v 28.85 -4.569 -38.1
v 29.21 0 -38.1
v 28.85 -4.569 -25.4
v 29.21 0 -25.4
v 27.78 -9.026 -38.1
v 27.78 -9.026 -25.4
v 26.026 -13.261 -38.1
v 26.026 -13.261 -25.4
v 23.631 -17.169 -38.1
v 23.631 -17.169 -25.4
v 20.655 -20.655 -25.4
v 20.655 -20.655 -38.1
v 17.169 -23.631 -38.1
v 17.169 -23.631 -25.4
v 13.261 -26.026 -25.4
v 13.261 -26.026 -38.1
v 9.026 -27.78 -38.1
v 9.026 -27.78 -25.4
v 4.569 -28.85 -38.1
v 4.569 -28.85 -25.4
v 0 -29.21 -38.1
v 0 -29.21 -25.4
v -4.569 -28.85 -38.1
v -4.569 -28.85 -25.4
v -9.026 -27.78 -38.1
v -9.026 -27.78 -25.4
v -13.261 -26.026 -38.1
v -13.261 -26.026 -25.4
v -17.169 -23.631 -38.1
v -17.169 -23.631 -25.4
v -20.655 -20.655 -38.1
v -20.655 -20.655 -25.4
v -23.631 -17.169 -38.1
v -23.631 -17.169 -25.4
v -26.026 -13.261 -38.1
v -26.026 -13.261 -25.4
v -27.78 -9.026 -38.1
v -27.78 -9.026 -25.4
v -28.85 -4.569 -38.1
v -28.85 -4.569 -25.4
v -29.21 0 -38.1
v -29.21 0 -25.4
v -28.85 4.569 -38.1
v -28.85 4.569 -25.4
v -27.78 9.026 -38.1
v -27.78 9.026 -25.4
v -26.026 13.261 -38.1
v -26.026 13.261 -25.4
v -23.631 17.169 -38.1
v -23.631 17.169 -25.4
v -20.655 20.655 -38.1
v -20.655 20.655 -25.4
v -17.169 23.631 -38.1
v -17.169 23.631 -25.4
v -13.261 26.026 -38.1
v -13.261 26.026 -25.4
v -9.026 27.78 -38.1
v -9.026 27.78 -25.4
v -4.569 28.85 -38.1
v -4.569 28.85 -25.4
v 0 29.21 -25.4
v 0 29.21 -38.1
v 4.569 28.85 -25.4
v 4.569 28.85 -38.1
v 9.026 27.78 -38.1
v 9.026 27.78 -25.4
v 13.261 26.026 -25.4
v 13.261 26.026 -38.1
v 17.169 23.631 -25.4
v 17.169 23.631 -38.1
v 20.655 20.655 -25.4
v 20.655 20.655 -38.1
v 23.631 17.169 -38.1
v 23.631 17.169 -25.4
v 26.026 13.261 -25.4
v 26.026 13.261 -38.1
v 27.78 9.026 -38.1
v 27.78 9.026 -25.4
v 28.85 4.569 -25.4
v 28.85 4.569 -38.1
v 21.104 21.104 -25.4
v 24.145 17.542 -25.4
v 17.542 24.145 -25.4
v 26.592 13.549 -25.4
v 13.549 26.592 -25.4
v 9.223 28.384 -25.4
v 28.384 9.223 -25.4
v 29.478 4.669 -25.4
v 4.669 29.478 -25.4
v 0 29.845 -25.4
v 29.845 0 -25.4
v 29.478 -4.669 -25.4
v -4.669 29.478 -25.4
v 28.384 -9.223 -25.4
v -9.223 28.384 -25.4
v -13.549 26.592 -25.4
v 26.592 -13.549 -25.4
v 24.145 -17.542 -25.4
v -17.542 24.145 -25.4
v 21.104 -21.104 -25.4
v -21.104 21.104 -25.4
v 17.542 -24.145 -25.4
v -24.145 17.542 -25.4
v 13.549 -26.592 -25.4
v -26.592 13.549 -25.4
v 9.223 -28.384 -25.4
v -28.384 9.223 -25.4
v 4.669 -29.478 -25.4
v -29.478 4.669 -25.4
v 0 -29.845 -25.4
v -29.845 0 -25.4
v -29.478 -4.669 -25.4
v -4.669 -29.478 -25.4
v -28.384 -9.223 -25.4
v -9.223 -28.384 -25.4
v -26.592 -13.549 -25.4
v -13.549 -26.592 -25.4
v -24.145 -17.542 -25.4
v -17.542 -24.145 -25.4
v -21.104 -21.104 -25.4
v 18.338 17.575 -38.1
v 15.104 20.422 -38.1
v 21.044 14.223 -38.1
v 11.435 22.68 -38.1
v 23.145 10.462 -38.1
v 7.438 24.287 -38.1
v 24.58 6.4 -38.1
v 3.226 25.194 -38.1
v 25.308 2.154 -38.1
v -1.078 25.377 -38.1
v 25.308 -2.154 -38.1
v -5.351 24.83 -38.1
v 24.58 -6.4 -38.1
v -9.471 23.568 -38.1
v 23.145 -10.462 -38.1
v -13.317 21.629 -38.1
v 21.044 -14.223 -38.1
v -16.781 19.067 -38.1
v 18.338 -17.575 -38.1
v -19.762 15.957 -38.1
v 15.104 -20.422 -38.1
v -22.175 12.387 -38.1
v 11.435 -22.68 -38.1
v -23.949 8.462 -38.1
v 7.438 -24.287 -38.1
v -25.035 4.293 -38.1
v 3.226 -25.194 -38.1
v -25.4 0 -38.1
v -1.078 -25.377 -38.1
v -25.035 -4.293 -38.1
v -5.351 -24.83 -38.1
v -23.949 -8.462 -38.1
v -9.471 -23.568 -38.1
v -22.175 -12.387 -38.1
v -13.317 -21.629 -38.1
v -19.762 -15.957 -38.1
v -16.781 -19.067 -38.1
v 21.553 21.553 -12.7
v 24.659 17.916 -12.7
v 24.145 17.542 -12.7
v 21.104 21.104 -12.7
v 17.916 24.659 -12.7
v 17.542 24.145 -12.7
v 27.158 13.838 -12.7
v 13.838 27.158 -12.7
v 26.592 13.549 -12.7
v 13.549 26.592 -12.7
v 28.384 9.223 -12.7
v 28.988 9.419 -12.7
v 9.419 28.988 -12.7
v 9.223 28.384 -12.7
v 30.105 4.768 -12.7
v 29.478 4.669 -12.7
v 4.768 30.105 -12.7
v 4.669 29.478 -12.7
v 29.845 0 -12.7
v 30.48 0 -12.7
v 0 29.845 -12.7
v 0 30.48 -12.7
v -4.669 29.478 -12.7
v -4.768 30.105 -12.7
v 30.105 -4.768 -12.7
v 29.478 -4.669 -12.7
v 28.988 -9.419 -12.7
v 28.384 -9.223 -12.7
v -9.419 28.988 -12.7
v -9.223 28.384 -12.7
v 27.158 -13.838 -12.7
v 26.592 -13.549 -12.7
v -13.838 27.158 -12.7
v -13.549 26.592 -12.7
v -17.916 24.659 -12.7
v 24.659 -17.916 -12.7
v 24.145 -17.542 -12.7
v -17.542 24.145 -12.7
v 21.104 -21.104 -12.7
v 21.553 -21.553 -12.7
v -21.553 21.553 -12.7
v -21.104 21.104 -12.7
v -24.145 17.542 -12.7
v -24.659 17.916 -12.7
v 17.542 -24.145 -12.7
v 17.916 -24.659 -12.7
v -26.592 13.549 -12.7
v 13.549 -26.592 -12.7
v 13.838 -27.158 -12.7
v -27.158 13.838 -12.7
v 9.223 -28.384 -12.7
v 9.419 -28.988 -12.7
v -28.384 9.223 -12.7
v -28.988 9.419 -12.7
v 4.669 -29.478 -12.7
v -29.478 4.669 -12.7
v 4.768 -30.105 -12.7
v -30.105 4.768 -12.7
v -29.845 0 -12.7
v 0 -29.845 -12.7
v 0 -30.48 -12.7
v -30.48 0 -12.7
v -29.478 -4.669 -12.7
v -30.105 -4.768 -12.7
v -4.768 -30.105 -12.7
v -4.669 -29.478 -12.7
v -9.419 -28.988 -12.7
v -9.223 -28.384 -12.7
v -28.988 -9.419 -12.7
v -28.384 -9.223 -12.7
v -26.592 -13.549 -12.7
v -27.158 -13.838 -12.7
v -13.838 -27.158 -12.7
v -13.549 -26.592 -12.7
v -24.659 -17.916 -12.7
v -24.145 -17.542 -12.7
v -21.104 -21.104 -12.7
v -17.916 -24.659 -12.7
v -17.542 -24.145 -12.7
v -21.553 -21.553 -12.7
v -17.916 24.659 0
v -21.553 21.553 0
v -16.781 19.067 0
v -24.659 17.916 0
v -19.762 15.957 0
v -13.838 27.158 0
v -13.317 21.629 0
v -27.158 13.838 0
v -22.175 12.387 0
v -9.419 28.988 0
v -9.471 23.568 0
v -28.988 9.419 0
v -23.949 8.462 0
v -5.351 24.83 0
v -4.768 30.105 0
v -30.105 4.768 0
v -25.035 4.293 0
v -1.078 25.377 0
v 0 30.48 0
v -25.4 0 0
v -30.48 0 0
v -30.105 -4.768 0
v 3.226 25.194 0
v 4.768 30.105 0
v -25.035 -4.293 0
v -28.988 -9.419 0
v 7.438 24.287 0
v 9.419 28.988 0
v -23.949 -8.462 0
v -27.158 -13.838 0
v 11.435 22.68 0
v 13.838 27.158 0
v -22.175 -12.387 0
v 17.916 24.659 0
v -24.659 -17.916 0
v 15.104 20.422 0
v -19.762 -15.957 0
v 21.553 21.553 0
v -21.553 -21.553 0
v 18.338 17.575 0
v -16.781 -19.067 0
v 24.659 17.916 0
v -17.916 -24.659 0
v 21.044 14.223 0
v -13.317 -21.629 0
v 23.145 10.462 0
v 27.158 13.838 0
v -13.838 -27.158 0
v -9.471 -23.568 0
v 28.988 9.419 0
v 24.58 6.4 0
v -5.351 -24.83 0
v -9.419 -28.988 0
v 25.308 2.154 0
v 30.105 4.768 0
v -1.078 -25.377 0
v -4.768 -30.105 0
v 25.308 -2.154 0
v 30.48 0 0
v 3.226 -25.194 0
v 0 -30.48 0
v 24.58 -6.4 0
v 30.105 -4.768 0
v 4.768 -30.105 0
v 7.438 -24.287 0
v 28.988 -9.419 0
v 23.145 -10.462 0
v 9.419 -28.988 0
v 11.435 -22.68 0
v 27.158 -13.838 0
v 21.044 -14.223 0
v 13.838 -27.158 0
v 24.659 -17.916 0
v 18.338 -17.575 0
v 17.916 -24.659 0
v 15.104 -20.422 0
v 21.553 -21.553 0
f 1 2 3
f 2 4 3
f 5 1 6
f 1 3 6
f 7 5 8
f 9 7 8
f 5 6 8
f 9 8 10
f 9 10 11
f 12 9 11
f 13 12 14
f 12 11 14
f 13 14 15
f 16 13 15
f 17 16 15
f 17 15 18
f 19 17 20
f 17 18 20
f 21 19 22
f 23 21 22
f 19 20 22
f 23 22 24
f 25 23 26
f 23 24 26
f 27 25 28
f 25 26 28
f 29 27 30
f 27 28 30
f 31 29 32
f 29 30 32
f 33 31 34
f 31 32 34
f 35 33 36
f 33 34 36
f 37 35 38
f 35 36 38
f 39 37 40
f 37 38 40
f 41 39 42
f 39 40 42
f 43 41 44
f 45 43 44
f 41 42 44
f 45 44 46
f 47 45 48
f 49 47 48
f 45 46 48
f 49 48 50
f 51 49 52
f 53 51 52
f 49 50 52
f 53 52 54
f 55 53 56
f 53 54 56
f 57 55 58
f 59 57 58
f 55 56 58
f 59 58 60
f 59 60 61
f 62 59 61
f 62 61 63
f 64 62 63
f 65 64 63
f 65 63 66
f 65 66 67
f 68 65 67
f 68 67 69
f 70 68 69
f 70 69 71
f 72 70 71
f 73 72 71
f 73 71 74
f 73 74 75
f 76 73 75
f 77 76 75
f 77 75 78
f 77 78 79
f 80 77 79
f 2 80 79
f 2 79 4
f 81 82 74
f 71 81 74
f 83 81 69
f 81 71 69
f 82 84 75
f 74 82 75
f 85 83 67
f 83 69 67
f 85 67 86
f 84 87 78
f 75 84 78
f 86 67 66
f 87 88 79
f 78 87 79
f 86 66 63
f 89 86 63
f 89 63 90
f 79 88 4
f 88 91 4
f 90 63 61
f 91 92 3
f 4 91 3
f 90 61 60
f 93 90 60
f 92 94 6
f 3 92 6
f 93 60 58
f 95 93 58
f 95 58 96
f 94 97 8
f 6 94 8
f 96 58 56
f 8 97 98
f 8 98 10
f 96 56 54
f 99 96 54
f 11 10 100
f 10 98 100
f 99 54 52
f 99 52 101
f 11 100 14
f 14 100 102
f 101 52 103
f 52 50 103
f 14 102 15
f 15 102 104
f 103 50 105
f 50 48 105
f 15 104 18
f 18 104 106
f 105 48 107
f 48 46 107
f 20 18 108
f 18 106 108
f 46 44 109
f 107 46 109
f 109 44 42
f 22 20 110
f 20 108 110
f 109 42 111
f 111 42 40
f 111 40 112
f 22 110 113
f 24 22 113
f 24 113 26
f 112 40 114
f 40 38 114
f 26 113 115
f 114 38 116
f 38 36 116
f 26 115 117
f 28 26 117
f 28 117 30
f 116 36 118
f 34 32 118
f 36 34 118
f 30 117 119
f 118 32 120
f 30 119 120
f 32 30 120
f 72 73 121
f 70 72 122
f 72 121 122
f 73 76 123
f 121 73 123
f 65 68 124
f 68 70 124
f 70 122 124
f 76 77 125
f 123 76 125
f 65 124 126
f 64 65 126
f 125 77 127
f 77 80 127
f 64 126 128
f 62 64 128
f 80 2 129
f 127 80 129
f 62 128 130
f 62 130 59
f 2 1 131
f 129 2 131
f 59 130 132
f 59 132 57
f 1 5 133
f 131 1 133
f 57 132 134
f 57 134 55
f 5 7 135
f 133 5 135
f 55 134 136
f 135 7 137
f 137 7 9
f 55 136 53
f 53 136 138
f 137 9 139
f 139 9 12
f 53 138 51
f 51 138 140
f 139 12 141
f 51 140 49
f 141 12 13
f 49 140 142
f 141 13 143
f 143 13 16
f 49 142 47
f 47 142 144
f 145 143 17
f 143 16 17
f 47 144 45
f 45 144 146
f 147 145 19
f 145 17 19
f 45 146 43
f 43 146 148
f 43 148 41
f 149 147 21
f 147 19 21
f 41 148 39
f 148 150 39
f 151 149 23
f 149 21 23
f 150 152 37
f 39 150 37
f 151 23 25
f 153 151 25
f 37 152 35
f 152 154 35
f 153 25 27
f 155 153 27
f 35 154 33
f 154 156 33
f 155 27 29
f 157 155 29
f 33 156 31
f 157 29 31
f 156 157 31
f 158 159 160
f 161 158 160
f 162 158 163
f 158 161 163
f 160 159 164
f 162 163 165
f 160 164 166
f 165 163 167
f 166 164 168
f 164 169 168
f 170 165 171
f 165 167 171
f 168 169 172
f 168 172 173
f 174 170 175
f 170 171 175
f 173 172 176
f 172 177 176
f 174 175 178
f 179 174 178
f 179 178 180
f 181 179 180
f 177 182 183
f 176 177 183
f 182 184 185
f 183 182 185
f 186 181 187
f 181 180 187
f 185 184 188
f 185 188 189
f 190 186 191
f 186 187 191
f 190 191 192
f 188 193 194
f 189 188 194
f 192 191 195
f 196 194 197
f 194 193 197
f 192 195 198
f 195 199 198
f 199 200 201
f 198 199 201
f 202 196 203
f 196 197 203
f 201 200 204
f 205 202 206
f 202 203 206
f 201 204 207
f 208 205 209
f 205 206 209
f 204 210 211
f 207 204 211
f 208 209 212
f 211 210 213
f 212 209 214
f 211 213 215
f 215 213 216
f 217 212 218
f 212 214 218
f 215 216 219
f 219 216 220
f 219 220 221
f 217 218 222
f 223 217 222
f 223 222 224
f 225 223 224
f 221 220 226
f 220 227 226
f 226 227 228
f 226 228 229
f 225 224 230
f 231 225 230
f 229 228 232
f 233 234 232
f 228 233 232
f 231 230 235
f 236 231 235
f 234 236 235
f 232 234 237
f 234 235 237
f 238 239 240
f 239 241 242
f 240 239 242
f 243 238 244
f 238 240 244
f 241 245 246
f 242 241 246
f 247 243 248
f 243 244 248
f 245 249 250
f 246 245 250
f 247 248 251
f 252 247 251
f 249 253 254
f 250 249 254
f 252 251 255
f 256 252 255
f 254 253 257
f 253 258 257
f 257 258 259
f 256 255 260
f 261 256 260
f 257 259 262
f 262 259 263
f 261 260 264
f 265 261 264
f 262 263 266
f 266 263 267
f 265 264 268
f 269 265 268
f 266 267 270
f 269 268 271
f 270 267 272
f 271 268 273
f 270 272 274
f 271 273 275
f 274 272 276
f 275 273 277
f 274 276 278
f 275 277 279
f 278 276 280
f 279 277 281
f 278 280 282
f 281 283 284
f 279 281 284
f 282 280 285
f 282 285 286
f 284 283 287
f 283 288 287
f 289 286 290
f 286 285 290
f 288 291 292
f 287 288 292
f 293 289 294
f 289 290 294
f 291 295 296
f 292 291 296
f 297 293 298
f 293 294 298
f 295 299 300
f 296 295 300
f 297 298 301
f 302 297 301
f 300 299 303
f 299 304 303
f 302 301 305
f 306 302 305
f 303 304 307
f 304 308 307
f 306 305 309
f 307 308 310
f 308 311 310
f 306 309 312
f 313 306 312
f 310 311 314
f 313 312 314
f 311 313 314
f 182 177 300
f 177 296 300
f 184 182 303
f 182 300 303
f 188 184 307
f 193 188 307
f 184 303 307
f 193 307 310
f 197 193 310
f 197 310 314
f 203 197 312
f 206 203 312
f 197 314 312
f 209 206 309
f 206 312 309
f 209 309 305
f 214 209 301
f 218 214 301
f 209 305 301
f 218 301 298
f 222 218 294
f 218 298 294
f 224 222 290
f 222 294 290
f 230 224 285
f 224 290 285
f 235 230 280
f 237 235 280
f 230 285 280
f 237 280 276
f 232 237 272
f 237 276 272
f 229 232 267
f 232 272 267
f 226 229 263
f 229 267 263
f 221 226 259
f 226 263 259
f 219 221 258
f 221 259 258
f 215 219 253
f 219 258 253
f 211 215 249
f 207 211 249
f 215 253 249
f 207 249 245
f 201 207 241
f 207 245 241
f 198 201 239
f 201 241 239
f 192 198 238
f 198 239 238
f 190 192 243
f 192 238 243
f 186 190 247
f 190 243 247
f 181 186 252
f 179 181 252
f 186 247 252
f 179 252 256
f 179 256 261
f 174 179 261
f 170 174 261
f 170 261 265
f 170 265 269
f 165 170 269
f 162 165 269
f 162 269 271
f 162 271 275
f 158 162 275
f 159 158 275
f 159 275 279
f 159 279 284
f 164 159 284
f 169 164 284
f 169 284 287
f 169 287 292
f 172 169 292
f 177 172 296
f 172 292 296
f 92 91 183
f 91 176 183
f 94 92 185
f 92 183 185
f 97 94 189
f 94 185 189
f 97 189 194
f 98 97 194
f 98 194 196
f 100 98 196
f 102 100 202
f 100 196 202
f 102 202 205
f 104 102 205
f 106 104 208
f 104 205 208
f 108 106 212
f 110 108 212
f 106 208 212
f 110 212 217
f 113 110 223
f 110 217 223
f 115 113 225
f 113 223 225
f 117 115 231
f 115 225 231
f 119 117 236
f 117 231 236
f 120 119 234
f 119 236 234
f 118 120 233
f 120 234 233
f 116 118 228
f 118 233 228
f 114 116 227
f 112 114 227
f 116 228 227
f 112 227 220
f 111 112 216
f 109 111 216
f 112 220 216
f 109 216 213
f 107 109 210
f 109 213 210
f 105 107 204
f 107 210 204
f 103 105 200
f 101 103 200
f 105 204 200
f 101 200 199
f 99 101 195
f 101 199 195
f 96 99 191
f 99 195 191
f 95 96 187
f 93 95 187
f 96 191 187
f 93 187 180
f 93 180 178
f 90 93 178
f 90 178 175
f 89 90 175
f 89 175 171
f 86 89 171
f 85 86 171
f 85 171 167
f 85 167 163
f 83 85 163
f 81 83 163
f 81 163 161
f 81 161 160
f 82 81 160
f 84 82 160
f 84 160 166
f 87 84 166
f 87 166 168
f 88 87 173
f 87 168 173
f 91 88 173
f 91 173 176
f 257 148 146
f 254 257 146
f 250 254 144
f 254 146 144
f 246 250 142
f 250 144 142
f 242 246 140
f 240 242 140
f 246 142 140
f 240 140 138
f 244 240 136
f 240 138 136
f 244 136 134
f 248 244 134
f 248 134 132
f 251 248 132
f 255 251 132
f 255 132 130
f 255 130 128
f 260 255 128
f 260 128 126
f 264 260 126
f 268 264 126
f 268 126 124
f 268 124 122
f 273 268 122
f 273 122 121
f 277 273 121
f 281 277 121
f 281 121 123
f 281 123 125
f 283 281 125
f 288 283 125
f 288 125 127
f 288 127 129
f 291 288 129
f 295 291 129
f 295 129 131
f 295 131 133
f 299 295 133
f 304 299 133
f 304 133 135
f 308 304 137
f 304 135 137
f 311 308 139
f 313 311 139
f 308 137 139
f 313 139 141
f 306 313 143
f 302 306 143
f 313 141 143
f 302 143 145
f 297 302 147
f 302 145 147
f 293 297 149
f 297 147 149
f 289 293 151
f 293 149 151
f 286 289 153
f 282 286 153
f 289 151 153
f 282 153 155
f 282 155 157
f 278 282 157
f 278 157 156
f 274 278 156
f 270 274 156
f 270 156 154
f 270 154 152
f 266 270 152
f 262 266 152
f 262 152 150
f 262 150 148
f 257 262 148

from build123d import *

# Parameters (mm, degrees)
SKETCH3_R          = 25.4
CUT_EXTRUDE2_DEPTH = 58.529738397


with BuildPart() as part:
    # Sketch1 → Revolve1 (revolve)
    with BuildSketch(Plane(origin=(0, 0, 0), x_dir=(1, 0, 0), z_dir=(0, 1, 0)), mode=Mode.PRIVATE) as revolve1_sk:
        Polygon((0, 0), (0, 38.1), (-29.21, 38.1), (-29.21, 25.4), (-29.845, 25.4), (-29.845, 12.7), (-30.48, 12.7), (-30.48, 0), align=None)
    revolve(revolve1_sk.sketch.rotate(Axis((0, 0, 0), (0, 0, -1)), 180), axis=Axis((0, 0, 0), (0, 0, -1)))

    # Sketch3 → Cut-Extrude2 (cut, through all)
    with BuildSketch(Plane(origin=(0, 0, -38.1), x_dir=(-1, 0, 0), z_dir=(0, 0, -1))):
        Circle(SKETCH3_R)
    extrude(amount=-CUT_EXTRUDE2_DEPTH, mode=Mode.SUBTRACT)


solid = part.part
